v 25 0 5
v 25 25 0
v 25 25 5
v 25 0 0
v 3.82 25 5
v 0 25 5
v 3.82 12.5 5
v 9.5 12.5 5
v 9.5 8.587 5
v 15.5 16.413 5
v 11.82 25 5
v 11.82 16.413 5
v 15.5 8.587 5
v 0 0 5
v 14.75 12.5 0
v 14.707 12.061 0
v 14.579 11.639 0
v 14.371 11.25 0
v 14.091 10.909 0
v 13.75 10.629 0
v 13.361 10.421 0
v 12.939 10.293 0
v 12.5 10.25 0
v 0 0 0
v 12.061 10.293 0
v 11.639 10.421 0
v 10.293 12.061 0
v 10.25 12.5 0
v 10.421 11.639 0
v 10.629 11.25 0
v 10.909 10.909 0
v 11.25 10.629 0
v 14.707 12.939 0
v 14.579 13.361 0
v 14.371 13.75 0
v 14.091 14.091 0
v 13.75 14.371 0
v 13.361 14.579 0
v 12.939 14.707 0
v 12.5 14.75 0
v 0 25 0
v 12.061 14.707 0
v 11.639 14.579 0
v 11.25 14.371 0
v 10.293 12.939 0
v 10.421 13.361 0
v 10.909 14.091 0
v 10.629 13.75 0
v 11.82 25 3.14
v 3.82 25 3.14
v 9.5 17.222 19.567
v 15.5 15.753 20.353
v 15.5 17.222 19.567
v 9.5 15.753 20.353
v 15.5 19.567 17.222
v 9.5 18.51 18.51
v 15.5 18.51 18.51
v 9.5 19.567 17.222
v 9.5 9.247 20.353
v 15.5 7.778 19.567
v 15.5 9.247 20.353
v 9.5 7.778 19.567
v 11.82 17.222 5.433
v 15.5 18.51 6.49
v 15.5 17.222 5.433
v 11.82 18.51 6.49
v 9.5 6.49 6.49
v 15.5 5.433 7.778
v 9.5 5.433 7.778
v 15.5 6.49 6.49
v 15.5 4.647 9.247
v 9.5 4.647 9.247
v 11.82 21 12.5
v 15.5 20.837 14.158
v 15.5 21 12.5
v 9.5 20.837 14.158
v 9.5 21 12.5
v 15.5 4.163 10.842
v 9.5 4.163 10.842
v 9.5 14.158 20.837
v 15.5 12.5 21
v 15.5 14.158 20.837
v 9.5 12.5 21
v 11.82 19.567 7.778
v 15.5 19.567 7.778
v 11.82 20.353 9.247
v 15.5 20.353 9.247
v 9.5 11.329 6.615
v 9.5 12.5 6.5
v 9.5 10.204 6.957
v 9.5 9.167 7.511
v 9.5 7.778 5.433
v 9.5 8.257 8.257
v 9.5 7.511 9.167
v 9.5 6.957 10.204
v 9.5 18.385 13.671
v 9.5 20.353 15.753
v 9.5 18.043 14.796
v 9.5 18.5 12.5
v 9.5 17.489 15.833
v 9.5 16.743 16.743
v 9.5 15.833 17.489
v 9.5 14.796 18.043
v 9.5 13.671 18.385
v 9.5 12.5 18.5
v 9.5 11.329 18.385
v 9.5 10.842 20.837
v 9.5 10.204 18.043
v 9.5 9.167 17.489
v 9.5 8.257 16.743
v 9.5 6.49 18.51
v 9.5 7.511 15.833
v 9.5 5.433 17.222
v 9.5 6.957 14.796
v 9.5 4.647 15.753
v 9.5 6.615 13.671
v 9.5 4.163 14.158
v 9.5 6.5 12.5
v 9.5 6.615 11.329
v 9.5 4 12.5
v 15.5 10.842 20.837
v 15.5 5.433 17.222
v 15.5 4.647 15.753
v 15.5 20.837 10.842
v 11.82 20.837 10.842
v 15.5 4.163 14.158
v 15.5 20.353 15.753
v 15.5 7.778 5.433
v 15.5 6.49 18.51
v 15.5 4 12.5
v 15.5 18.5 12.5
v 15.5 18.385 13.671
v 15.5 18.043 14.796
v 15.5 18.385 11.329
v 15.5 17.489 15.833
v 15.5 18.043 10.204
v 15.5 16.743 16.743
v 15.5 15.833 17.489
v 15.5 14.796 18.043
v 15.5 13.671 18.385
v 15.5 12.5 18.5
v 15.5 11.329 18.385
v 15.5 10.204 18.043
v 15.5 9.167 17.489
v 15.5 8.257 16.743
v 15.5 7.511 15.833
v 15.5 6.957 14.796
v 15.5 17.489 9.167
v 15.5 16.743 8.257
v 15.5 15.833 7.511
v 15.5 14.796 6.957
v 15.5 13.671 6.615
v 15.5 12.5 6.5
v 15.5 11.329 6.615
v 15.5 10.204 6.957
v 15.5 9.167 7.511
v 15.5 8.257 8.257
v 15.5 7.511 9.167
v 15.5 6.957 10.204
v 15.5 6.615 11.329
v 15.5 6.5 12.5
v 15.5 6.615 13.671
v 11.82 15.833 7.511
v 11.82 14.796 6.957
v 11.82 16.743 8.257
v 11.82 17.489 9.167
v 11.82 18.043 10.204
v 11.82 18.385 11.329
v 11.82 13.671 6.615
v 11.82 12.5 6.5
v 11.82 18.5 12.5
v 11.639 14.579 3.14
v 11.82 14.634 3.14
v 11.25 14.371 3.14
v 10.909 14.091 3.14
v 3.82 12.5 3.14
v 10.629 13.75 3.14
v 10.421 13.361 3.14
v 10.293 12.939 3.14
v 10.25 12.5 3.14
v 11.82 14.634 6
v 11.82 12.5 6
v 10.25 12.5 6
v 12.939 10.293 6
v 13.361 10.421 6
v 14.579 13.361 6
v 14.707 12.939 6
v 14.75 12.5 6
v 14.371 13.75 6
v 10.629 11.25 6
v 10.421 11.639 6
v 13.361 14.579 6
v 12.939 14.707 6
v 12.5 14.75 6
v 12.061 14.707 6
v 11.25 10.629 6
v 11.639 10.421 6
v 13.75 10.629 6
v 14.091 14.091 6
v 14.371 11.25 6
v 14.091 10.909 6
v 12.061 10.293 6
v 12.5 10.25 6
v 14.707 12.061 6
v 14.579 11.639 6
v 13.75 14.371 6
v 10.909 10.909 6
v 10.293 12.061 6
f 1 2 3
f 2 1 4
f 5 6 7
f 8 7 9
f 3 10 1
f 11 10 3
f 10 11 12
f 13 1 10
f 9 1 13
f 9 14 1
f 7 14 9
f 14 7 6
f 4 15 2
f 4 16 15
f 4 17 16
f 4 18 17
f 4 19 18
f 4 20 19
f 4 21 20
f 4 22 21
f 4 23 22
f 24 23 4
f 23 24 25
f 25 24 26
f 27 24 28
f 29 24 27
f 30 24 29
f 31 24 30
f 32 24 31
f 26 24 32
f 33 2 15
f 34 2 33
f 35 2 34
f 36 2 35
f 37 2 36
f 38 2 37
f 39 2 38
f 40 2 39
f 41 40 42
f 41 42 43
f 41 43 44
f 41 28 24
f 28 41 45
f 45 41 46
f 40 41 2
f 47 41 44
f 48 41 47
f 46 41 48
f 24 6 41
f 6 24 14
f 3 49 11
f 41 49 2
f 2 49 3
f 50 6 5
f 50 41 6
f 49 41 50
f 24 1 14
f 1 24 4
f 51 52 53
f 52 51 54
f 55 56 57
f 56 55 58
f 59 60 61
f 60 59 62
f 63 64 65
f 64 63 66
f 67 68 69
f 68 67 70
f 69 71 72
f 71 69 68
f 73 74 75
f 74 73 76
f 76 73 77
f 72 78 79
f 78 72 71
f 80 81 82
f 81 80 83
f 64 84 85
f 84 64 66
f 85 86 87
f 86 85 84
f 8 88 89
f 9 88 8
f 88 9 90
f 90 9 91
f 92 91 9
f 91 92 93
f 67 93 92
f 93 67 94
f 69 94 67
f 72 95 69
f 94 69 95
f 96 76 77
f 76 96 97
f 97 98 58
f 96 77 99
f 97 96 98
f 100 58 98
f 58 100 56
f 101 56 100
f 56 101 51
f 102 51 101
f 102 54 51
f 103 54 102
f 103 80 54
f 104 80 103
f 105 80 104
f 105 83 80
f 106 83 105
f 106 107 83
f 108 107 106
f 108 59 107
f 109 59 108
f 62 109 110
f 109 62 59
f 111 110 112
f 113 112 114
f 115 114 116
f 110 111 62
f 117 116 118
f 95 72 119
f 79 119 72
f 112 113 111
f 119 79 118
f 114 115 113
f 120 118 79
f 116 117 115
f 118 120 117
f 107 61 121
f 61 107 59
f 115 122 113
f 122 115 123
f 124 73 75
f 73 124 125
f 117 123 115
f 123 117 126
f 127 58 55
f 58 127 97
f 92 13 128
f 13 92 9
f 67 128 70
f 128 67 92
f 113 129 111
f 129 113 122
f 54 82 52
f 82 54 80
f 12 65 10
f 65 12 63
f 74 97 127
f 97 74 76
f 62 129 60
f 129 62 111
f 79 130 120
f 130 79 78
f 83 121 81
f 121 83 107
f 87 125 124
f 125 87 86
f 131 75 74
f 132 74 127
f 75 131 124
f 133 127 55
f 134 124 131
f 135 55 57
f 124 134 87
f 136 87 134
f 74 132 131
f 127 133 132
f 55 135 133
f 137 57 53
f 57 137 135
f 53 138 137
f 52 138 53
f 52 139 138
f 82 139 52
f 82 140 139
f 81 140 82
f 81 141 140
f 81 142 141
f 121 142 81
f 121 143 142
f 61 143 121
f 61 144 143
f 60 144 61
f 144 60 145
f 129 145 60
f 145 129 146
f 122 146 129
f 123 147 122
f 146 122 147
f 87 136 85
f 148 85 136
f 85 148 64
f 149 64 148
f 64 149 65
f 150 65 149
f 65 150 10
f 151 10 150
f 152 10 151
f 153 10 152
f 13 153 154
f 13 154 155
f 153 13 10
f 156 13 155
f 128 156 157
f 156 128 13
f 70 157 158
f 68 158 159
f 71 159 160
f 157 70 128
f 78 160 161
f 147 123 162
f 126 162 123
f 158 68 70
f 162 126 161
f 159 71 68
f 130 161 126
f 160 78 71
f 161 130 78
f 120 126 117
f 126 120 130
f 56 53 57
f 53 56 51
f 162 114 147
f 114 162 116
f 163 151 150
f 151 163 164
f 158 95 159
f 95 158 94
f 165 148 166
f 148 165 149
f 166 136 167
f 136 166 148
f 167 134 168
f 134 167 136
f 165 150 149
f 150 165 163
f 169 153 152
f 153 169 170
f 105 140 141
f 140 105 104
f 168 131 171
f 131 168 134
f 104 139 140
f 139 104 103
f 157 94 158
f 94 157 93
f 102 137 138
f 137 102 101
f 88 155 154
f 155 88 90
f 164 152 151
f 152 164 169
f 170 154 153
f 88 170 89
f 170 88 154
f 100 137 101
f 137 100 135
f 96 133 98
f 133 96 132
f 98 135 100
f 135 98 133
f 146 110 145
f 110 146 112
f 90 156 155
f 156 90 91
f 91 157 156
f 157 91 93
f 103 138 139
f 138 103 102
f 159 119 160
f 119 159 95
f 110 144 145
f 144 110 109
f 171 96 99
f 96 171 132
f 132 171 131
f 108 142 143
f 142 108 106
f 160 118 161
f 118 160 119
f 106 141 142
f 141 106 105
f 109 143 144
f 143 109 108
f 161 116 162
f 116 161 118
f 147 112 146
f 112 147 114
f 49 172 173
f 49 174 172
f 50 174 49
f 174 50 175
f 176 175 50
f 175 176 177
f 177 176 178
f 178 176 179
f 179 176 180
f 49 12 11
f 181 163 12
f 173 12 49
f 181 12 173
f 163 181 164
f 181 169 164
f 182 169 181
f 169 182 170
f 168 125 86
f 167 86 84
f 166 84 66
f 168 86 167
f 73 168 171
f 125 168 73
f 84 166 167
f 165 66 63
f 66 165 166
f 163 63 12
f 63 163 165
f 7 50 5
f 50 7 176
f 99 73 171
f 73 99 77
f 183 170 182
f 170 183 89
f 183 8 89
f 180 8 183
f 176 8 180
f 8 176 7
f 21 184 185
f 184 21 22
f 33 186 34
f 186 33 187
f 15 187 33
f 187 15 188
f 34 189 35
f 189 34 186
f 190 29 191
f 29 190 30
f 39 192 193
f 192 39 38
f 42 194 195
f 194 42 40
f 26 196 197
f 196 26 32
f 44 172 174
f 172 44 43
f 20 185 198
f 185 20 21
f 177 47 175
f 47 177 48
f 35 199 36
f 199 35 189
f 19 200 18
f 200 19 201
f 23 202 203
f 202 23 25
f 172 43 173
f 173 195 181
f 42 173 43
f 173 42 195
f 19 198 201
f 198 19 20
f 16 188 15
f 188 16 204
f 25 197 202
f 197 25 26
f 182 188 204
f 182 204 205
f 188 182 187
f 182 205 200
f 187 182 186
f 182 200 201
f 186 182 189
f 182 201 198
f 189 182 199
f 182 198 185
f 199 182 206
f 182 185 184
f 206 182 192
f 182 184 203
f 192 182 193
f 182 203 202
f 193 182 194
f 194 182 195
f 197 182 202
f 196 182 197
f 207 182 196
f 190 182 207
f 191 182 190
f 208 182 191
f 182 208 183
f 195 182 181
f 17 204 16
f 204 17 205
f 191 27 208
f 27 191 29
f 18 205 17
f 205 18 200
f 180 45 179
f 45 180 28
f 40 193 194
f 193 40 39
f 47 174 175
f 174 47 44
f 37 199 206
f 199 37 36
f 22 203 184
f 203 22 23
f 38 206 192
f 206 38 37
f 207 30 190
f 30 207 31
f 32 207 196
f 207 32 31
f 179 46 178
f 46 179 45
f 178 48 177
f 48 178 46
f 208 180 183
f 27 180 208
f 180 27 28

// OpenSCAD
$fn = 32;

// ----------------------------------------------------------------------
// Cable clip: cable 12 mm, clamp 17 mm, base 25 mm
// ----------------------------------------------------------------------

// --- parameters (mm) ---
plate_x = 25;             // base length, X
plate_y = 25;             // base width, Y
plate_t = 5;              // base thickness
wire_seat_d = 17;         // clamp outside diameter
clip_t = 2.5;             // clamp wall
cable_d = 12;             // cable opening
ring_w = 6;               // clamp width along the cable
screw_d = 4.5;            // screw clearance
throat = 9.36;            // snap throat width
sink = 1;                 // overlap of the clamp into the base

module base() {
  cube([plate_x, plate_y, plate_t]);
}

module clamp() {
  translate([plate_x / 2, plate_y / 2, plate_t + wire_seat_d / 2 - sink]) rotate([0, 90, 0])
    cylinder(h = ring_w, d = wire_seat_d, center = true);
}

difference() {
  union() {
    base();
    clamp();
  }
  translate([plate_x / 2, plate_y / 2, plate_t + wire_seat_d / 2 - sink]) rotate([0, 90, 0]) translate([0, 0, -ring_w / 2 - 1]) cylinder(h = ring_w + 2, d = cable_d);
  /* snap throat: the opening is narrower than the cable */
  translate([plate_x / 2 - throat / 2, plate_y / 2, plate_t + wire_seat_d / 2 - sink]) rotate([0, 90, 0]) translate([0, 0, -ring_w / 2 - 1]) cube([throat, wire_seat_d + 2, ring_w + 2]);
  translate([12.5, plate_y / 2, -1]) cylinder(h = plate_t + 2, d = screw_d);
}
